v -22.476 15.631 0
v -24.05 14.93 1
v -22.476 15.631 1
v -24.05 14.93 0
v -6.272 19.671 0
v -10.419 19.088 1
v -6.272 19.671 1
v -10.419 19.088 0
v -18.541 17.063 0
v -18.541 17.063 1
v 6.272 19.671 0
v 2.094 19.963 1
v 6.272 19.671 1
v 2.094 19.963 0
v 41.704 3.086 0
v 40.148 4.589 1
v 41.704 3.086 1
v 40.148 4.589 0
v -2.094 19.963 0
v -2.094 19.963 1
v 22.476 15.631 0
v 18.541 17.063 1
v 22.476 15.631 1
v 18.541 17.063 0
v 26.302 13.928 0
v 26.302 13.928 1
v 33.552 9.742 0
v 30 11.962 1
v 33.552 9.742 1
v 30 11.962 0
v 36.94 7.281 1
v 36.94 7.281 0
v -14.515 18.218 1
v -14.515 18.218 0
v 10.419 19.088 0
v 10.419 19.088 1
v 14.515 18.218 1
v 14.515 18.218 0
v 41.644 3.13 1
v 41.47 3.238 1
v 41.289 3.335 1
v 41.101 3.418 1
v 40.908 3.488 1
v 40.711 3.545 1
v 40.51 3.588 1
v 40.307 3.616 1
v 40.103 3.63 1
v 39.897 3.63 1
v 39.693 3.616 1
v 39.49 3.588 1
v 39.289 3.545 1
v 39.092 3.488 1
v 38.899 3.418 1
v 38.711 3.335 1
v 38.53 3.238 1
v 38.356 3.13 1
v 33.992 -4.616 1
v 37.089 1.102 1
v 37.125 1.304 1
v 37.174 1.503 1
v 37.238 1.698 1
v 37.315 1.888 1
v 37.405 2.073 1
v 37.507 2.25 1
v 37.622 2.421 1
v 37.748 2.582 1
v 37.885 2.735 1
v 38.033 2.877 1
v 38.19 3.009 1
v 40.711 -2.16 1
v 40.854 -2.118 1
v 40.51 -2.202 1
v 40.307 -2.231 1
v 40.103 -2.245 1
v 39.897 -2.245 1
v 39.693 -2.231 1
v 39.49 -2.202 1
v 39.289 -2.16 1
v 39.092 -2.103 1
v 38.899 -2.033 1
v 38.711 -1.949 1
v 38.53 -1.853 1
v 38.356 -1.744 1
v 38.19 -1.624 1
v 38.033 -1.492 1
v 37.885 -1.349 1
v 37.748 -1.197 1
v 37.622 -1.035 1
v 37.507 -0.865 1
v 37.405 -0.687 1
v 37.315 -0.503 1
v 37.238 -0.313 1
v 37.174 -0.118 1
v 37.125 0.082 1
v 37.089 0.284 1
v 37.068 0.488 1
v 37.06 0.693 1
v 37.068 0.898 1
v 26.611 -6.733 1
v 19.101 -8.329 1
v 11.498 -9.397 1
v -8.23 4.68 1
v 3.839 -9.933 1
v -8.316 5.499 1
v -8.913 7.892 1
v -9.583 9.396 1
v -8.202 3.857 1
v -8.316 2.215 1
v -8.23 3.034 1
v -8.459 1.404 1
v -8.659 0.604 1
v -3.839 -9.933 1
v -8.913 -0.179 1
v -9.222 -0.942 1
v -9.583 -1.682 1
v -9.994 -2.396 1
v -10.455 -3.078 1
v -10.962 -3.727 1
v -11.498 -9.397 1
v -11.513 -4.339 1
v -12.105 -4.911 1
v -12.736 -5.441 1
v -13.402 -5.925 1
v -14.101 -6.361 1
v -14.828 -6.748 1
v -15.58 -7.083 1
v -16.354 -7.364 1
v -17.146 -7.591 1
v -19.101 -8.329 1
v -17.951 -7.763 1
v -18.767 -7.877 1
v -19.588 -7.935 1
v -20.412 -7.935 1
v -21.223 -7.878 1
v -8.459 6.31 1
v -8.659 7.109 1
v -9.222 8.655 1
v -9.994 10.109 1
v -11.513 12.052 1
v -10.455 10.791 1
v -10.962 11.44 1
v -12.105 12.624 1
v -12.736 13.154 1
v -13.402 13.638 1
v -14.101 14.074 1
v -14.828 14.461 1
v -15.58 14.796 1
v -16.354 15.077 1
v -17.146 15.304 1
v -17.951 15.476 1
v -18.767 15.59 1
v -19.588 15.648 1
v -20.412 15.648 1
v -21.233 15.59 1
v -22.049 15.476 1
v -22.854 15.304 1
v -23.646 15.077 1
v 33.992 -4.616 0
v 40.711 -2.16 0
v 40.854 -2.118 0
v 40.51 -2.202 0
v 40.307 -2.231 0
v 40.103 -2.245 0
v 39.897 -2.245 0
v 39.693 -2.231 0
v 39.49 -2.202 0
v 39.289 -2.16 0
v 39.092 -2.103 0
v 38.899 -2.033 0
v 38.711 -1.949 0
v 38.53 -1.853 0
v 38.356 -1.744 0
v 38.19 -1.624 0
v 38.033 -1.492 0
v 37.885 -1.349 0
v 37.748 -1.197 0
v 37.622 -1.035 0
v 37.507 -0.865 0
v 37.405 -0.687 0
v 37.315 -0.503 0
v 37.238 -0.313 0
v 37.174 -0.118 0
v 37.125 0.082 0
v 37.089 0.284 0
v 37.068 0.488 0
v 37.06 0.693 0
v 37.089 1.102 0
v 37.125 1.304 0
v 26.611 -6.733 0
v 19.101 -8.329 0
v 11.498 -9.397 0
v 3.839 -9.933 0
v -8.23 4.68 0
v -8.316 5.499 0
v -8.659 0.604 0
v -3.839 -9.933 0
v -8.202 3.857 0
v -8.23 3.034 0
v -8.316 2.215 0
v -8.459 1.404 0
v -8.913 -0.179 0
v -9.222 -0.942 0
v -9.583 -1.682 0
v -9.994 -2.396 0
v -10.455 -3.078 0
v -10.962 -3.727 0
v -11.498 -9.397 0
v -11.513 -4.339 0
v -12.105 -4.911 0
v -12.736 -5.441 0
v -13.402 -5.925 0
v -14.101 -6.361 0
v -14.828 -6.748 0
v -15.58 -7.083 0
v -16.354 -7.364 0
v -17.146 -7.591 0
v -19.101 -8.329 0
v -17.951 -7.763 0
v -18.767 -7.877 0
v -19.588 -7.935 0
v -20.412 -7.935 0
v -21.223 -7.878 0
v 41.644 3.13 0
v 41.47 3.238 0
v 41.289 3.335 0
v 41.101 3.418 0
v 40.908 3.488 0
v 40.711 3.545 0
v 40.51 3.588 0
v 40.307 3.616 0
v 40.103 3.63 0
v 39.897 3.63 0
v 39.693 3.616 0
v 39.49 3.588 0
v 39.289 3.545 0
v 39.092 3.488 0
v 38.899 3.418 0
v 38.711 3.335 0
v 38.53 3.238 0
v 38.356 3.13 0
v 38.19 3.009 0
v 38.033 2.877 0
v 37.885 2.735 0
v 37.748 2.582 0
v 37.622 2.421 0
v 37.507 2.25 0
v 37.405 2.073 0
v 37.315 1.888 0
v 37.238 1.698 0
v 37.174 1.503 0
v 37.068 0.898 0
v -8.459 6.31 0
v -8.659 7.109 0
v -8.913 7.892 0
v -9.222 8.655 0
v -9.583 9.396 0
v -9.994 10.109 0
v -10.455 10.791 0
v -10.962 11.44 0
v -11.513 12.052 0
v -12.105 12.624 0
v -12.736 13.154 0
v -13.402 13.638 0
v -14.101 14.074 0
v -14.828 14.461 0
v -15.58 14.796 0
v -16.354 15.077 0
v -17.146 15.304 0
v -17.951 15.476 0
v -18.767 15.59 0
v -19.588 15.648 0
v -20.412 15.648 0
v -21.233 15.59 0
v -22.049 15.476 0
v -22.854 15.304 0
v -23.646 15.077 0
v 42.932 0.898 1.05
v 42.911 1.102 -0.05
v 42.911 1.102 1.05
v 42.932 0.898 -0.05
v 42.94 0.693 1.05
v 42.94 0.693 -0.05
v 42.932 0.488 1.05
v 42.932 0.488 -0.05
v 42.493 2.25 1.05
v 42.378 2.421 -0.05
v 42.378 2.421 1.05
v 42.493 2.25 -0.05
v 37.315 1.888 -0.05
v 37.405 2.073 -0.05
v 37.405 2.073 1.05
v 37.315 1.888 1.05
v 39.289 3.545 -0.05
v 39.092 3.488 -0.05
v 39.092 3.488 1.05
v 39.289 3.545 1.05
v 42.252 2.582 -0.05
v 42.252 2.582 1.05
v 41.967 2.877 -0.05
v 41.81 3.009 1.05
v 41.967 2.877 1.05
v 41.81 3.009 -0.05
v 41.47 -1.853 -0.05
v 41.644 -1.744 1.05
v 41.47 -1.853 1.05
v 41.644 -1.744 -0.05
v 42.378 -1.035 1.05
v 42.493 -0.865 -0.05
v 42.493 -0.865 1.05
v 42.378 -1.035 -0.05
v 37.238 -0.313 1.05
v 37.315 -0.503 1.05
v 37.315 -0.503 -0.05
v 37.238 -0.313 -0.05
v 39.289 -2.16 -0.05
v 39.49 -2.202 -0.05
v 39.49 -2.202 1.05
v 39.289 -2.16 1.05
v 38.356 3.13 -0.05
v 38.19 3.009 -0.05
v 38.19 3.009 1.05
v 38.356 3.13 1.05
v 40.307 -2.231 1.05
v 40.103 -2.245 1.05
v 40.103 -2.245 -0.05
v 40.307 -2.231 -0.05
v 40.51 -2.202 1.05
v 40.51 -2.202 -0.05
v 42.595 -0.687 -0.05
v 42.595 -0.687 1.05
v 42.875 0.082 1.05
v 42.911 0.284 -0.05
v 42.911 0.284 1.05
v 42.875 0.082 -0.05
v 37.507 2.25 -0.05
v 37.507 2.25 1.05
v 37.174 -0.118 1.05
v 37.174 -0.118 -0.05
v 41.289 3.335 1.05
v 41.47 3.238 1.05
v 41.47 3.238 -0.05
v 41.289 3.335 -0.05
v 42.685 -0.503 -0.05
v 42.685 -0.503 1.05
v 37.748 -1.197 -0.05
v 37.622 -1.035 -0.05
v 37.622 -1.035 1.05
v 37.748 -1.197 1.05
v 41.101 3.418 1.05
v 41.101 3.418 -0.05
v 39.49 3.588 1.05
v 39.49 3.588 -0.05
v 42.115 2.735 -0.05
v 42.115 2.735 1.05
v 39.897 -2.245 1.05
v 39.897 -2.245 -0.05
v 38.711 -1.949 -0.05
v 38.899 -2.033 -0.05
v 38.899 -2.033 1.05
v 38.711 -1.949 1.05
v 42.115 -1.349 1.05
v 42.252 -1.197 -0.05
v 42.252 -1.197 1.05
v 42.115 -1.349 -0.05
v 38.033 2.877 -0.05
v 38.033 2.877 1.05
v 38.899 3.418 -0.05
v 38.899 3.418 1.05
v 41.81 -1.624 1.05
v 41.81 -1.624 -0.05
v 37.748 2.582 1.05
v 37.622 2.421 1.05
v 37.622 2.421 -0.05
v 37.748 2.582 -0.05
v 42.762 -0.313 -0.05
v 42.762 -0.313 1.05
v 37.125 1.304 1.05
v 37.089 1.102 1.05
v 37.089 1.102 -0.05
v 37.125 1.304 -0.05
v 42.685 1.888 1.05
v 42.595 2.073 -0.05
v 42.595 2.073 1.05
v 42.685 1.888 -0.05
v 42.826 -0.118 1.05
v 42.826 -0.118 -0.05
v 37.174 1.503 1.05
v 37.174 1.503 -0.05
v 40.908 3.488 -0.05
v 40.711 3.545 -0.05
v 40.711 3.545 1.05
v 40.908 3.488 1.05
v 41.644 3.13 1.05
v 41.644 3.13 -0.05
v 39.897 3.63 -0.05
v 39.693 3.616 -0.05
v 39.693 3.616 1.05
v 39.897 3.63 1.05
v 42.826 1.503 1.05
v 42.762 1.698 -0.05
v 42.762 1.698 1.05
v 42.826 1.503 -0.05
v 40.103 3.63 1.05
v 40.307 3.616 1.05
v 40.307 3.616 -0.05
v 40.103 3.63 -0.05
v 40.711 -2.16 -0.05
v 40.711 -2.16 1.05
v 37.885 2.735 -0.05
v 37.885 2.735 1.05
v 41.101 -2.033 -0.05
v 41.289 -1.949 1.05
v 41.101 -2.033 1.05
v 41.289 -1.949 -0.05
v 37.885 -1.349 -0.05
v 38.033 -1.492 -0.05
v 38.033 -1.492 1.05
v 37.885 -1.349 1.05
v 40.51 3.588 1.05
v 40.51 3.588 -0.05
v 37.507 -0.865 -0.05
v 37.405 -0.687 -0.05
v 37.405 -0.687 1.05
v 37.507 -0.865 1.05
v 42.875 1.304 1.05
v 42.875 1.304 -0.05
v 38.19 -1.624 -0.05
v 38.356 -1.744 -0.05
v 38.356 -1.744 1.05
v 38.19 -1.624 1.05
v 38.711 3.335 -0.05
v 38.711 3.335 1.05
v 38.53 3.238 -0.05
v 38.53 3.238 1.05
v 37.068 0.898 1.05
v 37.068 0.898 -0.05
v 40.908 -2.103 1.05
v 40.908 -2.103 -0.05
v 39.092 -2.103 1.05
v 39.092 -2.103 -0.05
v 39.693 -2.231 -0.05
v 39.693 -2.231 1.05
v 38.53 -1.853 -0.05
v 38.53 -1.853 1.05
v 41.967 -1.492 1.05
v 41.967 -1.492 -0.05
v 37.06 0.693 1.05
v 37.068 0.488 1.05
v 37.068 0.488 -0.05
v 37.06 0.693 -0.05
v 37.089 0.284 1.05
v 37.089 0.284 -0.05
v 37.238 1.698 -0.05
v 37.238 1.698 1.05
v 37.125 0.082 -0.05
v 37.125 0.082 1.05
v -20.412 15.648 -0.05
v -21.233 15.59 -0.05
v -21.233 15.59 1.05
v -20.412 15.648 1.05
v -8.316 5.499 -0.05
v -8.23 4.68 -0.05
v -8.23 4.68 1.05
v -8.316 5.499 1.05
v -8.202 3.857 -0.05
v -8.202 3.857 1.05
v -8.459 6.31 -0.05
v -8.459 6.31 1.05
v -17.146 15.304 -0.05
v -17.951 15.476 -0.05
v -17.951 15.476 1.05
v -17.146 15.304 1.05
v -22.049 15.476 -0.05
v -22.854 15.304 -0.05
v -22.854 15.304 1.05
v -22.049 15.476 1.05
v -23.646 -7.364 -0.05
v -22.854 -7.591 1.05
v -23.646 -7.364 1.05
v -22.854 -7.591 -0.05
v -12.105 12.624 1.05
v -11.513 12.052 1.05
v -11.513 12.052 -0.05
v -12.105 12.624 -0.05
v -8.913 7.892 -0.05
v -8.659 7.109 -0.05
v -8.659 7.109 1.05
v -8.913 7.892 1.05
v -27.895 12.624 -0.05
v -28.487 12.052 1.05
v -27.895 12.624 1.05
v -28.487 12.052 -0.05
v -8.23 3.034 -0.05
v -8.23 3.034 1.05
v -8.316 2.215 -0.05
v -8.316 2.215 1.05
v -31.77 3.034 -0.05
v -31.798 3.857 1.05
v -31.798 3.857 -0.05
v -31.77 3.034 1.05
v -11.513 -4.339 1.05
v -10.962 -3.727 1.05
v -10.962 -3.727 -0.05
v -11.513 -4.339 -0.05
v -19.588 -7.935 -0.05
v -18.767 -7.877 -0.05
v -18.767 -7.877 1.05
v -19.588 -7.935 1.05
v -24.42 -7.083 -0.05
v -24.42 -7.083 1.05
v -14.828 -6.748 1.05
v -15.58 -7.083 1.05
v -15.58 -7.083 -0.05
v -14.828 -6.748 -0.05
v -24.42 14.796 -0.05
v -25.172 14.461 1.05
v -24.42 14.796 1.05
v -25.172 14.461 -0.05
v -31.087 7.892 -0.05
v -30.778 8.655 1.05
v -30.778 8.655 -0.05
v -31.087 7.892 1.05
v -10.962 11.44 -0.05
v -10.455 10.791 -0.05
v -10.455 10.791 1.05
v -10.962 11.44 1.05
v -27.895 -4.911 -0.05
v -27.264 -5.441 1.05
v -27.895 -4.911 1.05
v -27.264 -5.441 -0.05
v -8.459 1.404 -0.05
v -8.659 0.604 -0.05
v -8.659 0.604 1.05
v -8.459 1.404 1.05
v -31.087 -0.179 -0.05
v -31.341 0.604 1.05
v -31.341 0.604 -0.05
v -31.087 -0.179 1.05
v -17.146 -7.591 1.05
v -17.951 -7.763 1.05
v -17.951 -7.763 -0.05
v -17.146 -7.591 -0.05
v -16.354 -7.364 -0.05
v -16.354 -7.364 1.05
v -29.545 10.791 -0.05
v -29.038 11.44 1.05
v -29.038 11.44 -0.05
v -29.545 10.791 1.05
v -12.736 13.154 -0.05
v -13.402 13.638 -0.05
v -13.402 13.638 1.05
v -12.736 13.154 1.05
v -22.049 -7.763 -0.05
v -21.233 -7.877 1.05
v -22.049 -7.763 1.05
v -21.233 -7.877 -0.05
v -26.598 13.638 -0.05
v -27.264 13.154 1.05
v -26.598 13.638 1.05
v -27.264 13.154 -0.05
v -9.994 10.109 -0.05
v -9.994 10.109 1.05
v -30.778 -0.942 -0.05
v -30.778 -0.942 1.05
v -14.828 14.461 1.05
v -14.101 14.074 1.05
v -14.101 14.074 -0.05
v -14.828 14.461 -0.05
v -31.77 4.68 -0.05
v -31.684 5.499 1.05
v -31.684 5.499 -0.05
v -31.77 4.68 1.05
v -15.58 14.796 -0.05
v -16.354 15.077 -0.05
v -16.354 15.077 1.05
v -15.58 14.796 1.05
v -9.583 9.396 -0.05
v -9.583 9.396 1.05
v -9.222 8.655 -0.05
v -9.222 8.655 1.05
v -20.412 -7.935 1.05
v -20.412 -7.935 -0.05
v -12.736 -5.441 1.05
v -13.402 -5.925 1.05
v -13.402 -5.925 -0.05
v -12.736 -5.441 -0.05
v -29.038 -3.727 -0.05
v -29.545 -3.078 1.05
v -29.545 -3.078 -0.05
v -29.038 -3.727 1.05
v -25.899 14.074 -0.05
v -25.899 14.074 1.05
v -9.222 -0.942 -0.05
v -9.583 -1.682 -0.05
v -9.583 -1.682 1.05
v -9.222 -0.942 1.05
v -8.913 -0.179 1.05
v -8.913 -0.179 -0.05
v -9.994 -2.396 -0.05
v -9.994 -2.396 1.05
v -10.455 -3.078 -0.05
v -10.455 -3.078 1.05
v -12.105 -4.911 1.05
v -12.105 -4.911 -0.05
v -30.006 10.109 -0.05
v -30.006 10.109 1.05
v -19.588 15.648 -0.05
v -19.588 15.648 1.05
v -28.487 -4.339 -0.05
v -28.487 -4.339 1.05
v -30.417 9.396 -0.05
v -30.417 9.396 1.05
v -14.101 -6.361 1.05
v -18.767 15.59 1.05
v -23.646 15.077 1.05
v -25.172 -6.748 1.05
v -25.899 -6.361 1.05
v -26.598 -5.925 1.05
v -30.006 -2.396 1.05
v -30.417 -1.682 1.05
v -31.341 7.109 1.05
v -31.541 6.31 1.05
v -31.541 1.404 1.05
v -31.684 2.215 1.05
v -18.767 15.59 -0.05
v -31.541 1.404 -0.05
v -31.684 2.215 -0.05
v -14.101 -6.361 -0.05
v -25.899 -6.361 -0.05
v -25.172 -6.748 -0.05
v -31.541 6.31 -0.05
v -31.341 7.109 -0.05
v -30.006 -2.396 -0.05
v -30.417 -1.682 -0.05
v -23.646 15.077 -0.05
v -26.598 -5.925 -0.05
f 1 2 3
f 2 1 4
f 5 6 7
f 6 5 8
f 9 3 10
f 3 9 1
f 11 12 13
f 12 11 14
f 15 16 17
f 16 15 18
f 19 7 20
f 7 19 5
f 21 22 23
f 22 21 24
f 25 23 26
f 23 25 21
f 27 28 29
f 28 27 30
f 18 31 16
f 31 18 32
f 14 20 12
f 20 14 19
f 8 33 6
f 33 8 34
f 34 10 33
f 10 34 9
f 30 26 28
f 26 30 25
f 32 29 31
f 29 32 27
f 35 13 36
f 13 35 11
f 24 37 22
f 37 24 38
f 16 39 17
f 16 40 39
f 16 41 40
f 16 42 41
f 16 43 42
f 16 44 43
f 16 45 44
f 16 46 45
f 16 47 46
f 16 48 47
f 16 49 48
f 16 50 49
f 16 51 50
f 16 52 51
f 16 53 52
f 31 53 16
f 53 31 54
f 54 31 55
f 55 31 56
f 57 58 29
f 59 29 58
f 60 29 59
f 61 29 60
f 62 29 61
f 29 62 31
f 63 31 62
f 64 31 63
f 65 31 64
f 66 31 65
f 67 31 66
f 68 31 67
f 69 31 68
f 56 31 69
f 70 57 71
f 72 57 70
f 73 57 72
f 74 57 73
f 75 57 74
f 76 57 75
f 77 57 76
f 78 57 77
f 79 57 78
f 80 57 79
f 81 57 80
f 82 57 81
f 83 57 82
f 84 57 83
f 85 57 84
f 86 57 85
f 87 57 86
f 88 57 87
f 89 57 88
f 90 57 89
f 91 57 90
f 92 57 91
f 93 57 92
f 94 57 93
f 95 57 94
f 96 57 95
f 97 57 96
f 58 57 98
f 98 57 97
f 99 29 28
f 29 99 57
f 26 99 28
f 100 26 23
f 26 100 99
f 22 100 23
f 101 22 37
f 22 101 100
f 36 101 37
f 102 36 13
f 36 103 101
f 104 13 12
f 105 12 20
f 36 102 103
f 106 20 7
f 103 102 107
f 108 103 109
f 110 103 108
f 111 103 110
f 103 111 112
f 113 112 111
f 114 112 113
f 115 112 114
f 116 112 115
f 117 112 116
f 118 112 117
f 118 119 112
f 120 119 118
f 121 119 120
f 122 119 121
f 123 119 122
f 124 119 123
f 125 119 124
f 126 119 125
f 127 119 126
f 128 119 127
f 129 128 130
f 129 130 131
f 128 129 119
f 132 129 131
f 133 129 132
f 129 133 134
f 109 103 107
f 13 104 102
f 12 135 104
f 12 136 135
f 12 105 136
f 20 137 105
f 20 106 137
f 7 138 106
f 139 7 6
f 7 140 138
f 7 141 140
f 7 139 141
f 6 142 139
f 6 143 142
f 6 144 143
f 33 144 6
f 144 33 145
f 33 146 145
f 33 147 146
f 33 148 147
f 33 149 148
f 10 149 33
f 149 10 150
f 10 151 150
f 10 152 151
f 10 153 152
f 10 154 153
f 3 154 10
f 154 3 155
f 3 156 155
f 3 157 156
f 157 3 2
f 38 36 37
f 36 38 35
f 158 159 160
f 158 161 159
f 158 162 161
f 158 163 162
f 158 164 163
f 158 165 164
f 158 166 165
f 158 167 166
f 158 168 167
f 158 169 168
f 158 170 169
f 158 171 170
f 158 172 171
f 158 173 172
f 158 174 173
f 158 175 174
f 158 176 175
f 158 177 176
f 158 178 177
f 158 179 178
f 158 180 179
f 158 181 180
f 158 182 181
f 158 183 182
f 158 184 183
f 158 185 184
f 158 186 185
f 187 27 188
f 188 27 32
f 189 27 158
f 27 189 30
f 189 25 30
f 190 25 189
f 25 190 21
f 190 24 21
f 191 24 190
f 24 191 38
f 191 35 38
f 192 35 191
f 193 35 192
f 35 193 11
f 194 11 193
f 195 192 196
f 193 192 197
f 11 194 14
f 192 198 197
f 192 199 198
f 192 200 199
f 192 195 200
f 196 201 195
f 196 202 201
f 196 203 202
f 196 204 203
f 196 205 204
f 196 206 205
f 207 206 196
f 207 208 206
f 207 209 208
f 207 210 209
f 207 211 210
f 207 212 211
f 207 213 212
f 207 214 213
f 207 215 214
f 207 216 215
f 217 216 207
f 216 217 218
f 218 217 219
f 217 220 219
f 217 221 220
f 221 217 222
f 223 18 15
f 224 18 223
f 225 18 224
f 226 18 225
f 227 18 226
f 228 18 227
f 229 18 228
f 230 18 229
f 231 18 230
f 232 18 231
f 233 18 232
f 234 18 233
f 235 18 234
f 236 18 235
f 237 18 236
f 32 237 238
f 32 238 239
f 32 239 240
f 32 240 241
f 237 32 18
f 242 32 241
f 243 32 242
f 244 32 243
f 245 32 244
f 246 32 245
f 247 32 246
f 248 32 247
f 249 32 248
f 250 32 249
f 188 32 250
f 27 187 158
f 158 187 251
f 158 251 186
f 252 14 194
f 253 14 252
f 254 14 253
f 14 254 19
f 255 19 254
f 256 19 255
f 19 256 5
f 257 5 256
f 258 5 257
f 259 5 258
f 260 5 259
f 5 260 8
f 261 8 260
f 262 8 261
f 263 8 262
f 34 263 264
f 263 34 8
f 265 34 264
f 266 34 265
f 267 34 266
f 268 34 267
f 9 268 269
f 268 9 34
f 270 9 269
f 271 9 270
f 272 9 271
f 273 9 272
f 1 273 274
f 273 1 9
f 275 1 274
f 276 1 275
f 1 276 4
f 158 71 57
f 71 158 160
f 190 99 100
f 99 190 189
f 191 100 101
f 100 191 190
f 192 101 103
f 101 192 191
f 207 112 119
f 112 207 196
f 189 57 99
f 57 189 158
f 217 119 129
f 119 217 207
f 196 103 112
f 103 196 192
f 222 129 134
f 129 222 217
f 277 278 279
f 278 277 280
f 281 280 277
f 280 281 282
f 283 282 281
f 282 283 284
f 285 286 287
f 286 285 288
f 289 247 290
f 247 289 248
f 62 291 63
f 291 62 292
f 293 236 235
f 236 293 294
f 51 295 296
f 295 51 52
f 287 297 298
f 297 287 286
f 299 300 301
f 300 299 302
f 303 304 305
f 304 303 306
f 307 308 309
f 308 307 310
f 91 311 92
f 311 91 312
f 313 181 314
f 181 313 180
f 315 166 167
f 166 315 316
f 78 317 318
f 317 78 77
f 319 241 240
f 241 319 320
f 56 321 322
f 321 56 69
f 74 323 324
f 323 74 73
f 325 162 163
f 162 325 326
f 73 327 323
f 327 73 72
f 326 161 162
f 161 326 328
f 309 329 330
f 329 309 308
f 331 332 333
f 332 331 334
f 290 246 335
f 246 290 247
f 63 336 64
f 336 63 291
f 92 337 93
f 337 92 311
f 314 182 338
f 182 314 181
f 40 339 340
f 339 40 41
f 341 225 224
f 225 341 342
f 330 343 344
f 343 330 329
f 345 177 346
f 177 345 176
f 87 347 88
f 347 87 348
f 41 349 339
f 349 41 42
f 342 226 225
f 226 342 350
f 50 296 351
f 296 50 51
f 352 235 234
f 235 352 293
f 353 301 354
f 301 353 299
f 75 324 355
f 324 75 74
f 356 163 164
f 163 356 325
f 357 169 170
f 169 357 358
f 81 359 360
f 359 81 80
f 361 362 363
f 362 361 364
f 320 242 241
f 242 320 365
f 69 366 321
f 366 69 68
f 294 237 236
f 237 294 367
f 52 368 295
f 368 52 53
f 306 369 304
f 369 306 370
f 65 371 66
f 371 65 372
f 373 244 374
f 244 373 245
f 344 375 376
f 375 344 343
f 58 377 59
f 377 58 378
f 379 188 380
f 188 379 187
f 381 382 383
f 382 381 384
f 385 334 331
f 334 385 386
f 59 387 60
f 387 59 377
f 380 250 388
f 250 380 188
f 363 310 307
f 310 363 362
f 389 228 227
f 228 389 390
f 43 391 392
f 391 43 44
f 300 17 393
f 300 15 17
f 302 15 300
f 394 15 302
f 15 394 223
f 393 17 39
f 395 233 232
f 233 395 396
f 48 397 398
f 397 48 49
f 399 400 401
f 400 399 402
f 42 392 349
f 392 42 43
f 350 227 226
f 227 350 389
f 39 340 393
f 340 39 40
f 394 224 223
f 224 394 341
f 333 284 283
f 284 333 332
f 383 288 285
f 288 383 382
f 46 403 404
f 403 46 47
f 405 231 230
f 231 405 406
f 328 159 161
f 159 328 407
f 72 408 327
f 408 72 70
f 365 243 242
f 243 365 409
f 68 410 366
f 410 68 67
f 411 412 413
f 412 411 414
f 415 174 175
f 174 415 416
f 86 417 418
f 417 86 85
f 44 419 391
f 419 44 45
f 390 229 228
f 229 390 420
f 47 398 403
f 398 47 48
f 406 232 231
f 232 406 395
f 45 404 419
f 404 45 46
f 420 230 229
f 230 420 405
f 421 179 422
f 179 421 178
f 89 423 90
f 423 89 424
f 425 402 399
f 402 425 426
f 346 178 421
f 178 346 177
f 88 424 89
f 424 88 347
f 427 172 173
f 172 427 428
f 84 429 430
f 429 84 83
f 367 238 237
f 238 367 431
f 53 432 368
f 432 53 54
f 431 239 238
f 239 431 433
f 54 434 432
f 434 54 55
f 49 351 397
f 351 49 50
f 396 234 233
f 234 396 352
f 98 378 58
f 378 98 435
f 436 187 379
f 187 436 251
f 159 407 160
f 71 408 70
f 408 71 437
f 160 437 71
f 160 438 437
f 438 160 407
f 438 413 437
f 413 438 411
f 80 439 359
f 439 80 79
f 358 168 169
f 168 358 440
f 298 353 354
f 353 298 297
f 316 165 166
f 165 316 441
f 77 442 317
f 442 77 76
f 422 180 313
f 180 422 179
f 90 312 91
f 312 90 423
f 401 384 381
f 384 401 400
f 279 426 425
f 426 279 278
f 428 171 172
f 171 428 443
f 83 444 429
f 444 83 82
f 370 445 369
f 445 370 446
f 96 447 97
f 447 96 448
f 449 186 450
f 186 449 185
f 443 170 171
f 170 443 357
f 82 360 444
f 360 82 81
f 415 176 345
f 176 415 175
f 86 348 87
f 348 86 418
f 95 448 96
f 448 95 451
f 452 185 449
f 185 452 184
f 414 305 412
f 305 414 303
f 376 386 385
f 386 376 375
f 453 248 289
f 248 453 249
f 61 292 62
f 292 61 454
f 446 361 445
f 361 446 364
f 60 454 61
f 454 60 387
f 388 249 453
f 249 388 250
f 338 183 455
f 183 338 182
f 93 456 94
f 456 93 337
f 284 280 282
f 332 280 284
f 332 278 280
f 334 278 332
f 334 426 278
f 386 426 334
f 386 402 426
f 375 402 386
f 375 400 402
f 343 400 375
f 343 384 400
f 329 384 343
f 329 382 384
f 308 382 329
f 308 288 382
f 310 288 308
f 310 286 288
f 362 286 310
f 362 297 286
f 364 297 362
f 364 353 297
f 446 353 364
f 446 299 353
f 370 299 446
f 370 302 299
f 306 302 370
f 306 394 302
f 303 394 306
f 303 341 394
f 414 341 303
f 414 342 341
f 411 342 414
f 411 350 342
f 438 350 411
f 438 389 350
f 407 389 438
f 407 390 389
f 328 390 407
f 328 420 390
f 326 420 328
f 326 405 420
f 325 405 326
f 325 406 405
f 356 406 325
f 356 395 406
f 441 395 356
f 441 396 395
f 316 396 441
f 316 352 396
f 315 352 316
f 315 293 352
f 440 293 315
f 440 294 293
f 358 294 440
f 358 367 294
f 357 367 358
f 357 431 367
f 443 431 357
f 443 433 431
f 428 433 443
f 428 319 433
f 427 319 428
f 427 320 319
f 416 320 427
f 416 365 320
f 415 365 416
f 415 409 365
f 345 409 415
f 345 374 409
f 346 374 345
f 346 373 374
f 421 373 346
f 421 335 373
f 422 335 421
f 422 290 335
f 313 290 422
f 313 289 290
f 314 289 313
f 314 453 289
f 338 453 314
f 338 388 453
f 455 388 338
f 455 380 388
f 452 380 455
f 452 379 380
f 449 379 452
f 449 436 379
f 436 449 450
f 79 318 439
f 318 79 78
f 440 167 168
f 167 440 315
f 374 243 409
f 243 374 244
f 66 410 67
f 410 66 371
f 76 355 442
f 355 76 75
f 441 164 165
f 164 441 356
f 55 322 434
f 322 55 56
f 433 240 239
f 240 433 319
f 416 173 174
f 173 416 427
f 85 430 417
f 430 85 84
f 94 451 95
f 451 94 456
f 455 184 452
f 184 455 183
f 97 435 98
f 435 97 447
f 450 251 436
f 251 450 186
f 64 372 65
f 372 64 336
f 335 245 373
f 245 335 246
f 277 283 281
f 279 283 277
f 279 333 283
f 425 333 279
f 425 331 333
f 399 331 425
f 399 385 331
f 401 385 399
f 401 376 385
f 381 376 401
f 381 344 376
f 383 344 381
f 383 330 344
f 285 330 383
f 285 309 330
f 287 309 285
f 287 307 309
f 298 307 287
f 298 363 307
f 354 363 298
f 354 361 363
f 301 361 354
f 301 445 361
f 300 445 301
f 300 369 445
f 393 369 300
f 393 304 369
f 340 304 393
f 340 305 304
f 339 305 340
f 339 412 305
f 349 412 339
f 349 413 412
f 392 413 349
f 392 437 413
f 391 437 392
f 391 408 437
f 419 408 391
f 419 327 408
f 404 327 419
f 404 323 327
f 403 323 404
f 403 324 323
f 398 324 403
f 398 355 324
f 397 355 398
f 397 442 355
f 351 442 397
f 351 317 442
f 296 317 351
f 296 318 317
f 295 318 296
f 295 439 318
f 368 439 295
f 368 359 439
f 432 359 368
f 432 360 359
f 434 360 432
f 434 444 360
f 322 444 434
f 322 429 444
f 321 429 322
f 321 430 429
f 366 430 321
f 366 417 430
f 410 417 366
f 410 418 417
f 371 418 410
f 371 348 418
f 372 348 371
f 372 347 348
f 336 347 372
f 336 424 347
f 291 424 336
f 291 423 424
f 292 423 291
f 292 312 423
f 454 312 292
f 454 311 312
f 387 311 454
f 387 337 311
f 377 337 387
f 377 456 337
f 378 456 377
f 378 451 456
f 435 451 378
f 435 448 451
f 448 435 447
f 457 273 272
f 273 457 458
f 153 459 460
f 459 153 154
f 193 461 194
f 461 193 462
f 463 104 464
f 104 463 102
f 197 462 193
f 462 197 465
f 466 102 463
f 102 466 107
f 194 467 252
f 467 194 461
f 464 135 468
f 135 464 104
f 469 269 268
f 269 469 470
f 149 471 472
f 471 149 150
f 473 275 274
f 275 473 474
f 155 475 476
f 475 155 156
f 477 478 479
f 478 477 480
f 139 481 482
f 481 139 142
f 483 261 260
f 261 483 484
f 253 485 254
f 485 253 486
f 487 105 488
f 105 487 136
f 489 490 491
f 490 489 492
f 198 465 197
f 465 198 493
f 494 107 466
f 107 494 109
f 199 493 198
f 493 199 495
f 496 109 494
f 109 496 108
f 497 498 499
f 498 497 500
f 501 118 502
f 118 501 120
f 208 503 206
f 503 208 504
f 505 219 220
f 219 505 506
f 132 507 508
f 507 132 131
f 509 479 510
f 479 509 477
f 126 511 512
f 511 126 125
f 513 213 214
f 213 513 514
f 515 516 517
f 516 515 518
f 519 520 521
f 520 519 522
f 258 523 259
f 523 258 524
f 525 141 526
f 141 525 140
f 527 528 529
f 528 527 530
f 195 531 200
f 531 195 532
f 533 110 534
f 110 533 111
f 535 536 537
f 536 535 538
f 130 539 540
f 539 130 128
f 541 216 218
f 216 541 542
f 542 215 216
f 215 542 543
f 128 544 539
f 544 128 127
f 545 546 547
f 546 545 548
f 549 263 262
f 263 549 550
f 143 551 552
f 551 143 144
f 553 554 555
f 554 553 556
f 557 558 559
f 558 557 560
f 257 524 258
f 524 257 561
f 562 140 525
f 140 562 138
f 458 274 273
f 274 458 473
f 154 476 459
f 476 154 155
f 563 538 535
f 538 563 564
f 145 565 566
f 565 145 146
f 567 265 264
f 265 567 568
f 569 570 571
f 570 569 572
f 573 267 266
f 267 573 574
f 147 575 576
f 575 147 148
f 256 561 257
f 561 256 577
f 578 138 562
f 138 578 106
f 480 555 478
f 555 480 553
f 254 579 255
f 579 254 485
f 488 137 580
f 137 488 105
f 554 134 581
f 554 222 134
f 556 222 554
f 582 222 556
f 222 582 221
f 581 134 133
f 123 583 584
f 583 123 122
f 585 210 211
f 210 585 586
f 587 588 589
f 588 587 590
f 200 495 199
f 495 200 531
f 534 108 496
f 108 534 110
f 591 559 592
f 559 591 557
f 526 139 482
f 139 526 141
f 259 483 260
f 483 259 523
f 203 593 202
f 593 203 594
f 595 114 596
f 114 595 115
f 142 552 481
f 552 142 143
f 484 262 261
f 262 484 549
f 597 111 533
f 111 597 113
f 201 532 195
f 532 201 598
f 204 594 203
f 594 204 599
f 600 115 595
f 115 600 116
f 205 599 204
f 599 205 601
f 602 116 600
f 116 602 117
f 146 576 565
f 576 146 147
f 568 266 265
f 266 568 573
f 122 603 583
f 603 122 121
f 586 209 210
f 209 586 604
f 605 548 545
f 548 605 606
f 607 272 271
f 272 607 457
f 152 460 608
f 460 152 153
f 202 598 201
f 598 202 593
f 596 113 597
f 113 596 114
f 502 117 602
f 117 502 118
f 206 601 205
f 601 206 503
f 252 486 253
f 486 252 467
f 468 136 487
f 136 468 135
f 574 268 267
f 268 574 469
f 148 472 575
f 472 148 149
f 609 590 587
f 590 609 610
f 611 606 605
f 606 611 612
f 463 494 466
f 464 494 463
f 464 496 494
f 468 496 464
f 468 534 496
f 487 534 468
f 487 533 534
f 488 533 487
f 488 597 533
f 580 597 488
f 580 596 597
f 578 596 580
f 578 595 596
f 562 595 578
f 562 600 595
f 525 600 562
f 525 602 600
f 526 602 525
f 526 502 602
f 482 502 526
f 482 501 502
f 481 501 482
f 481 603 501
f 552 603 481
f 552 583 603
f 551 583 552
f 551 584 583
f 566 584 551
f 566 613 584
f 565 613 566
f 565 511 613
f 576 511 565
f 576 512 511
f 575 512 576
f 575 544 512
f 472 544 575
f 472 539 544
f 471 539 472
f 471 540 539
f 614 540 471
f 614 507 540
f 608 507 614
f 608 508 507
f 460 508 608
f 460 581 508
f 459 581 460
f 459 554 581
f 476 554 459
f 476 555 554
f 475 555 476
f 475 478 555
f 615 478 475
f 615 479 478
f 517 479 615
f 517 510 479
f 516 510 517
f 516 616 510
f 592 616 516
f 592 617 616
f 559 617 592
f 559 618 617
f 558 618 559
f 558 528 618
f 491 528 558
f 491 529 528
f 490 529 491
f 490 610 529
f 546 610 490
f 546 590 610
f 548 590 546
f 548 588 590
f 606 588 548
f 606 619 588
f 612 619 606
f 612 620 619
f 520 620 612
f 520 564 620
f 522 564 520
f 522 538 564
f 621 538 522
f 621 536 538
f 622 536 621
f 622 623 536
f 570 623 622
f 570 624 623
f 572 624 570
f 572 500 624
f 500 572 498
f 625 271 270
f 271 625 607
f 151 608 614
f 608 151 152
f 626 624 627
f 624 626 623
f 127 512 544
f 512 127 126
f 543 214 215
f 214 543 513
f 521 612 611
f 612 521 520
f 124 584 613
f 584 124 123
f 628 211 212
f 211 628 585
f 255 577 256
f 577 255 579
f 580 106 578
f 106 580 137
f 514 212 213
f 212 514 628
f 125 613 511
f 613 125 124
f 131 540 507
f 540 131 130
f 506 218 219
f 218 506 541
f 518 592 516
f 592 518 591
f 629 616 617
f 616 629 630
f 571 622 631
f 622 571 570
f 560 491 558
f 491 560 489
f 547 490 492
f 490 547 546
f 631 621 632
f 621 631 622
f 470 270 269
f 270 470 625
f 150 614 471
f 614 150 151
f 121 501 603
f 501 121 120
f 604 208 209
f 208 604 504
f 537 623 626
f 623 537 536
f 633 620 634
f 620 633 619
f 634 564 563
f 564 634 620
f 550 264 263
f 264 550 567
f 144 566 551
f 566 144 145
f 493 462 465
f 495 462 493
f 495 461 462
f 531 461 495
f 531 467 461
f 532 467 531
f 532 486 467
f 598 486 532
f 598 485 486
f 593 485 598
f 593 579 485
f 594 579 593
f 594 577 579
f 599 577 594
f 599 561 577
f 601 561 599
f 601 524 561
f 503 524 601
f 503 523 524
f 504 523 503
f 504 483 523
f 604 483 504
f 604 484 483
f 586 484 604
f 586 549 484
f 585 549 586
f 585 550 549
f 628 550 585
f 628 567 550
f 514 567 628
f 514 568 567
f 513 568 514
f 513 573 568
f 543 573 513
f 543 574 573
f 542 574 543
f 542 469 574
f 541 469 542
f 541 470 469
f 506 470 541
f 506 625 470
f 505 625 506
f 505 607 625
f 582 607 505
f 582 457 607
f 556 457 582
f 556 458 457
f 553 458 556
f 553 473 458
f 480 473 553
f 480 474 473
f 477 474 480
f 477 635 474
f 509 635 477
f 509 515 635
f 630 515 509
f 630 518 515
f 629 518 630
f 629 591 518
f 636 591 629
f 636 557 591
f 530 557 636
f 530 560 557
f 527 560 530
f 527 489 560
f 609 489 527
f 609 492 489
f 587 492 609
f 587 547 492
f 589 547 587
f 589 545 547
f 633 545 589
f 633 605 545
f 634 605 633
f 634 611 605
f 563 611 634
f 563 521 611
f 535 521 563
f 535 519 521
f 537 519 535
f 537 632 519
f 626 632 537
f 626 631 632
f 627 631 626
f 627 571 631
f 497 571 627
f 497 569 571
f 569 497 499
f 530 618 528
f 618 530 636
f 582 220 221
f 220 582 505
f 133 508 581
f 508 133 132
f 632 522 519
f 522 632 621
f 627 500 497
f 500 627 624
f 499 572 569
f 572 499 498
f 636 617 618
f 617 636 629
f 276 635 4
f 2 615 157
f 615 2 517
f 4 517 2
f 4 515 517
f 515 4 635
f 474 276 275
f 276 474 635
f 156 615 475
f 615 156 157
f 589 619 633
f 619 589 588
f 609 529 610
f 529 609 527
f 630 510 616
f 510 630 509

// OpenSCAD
$fn = 90;

union() {
	union() {
		difference() {
			difference() {
				intersection() {
					translate(v = [0, -40, 0]) {
						cylinder(h = 1, r = 60);
					}
					translate(v = [0, 100, 0]) {
						cylinder(h = 1, r = 110);
					}
				}
				translate(v = [-242.4028853967, -7.6945250507, -0.0500000000]) {
					cube(size = [220, 22.2858983472, 1.1000000000]);
				}
			}
			translate(v = [41.0982751437, -2.0339736569, -0.0500000000]) {
				cube(size = [220, 4.8230074239, 1.1000000000]);
			}
		}
		color(c = [0, 1, 0]) {
			translate(v = [40, 0.6926949609, -0.0500000000]) {
				cylinder(h = 1.1000000000, r = 2.9395458905);
			}
		}
	}
	color(c = [1, 0, 0]) {
		translate(v = [-20, 3.8565585249, -0.0500000000]) {
			cylinder(h = 1.1000000000, r = 11.7983638696);
		}
	}
}
